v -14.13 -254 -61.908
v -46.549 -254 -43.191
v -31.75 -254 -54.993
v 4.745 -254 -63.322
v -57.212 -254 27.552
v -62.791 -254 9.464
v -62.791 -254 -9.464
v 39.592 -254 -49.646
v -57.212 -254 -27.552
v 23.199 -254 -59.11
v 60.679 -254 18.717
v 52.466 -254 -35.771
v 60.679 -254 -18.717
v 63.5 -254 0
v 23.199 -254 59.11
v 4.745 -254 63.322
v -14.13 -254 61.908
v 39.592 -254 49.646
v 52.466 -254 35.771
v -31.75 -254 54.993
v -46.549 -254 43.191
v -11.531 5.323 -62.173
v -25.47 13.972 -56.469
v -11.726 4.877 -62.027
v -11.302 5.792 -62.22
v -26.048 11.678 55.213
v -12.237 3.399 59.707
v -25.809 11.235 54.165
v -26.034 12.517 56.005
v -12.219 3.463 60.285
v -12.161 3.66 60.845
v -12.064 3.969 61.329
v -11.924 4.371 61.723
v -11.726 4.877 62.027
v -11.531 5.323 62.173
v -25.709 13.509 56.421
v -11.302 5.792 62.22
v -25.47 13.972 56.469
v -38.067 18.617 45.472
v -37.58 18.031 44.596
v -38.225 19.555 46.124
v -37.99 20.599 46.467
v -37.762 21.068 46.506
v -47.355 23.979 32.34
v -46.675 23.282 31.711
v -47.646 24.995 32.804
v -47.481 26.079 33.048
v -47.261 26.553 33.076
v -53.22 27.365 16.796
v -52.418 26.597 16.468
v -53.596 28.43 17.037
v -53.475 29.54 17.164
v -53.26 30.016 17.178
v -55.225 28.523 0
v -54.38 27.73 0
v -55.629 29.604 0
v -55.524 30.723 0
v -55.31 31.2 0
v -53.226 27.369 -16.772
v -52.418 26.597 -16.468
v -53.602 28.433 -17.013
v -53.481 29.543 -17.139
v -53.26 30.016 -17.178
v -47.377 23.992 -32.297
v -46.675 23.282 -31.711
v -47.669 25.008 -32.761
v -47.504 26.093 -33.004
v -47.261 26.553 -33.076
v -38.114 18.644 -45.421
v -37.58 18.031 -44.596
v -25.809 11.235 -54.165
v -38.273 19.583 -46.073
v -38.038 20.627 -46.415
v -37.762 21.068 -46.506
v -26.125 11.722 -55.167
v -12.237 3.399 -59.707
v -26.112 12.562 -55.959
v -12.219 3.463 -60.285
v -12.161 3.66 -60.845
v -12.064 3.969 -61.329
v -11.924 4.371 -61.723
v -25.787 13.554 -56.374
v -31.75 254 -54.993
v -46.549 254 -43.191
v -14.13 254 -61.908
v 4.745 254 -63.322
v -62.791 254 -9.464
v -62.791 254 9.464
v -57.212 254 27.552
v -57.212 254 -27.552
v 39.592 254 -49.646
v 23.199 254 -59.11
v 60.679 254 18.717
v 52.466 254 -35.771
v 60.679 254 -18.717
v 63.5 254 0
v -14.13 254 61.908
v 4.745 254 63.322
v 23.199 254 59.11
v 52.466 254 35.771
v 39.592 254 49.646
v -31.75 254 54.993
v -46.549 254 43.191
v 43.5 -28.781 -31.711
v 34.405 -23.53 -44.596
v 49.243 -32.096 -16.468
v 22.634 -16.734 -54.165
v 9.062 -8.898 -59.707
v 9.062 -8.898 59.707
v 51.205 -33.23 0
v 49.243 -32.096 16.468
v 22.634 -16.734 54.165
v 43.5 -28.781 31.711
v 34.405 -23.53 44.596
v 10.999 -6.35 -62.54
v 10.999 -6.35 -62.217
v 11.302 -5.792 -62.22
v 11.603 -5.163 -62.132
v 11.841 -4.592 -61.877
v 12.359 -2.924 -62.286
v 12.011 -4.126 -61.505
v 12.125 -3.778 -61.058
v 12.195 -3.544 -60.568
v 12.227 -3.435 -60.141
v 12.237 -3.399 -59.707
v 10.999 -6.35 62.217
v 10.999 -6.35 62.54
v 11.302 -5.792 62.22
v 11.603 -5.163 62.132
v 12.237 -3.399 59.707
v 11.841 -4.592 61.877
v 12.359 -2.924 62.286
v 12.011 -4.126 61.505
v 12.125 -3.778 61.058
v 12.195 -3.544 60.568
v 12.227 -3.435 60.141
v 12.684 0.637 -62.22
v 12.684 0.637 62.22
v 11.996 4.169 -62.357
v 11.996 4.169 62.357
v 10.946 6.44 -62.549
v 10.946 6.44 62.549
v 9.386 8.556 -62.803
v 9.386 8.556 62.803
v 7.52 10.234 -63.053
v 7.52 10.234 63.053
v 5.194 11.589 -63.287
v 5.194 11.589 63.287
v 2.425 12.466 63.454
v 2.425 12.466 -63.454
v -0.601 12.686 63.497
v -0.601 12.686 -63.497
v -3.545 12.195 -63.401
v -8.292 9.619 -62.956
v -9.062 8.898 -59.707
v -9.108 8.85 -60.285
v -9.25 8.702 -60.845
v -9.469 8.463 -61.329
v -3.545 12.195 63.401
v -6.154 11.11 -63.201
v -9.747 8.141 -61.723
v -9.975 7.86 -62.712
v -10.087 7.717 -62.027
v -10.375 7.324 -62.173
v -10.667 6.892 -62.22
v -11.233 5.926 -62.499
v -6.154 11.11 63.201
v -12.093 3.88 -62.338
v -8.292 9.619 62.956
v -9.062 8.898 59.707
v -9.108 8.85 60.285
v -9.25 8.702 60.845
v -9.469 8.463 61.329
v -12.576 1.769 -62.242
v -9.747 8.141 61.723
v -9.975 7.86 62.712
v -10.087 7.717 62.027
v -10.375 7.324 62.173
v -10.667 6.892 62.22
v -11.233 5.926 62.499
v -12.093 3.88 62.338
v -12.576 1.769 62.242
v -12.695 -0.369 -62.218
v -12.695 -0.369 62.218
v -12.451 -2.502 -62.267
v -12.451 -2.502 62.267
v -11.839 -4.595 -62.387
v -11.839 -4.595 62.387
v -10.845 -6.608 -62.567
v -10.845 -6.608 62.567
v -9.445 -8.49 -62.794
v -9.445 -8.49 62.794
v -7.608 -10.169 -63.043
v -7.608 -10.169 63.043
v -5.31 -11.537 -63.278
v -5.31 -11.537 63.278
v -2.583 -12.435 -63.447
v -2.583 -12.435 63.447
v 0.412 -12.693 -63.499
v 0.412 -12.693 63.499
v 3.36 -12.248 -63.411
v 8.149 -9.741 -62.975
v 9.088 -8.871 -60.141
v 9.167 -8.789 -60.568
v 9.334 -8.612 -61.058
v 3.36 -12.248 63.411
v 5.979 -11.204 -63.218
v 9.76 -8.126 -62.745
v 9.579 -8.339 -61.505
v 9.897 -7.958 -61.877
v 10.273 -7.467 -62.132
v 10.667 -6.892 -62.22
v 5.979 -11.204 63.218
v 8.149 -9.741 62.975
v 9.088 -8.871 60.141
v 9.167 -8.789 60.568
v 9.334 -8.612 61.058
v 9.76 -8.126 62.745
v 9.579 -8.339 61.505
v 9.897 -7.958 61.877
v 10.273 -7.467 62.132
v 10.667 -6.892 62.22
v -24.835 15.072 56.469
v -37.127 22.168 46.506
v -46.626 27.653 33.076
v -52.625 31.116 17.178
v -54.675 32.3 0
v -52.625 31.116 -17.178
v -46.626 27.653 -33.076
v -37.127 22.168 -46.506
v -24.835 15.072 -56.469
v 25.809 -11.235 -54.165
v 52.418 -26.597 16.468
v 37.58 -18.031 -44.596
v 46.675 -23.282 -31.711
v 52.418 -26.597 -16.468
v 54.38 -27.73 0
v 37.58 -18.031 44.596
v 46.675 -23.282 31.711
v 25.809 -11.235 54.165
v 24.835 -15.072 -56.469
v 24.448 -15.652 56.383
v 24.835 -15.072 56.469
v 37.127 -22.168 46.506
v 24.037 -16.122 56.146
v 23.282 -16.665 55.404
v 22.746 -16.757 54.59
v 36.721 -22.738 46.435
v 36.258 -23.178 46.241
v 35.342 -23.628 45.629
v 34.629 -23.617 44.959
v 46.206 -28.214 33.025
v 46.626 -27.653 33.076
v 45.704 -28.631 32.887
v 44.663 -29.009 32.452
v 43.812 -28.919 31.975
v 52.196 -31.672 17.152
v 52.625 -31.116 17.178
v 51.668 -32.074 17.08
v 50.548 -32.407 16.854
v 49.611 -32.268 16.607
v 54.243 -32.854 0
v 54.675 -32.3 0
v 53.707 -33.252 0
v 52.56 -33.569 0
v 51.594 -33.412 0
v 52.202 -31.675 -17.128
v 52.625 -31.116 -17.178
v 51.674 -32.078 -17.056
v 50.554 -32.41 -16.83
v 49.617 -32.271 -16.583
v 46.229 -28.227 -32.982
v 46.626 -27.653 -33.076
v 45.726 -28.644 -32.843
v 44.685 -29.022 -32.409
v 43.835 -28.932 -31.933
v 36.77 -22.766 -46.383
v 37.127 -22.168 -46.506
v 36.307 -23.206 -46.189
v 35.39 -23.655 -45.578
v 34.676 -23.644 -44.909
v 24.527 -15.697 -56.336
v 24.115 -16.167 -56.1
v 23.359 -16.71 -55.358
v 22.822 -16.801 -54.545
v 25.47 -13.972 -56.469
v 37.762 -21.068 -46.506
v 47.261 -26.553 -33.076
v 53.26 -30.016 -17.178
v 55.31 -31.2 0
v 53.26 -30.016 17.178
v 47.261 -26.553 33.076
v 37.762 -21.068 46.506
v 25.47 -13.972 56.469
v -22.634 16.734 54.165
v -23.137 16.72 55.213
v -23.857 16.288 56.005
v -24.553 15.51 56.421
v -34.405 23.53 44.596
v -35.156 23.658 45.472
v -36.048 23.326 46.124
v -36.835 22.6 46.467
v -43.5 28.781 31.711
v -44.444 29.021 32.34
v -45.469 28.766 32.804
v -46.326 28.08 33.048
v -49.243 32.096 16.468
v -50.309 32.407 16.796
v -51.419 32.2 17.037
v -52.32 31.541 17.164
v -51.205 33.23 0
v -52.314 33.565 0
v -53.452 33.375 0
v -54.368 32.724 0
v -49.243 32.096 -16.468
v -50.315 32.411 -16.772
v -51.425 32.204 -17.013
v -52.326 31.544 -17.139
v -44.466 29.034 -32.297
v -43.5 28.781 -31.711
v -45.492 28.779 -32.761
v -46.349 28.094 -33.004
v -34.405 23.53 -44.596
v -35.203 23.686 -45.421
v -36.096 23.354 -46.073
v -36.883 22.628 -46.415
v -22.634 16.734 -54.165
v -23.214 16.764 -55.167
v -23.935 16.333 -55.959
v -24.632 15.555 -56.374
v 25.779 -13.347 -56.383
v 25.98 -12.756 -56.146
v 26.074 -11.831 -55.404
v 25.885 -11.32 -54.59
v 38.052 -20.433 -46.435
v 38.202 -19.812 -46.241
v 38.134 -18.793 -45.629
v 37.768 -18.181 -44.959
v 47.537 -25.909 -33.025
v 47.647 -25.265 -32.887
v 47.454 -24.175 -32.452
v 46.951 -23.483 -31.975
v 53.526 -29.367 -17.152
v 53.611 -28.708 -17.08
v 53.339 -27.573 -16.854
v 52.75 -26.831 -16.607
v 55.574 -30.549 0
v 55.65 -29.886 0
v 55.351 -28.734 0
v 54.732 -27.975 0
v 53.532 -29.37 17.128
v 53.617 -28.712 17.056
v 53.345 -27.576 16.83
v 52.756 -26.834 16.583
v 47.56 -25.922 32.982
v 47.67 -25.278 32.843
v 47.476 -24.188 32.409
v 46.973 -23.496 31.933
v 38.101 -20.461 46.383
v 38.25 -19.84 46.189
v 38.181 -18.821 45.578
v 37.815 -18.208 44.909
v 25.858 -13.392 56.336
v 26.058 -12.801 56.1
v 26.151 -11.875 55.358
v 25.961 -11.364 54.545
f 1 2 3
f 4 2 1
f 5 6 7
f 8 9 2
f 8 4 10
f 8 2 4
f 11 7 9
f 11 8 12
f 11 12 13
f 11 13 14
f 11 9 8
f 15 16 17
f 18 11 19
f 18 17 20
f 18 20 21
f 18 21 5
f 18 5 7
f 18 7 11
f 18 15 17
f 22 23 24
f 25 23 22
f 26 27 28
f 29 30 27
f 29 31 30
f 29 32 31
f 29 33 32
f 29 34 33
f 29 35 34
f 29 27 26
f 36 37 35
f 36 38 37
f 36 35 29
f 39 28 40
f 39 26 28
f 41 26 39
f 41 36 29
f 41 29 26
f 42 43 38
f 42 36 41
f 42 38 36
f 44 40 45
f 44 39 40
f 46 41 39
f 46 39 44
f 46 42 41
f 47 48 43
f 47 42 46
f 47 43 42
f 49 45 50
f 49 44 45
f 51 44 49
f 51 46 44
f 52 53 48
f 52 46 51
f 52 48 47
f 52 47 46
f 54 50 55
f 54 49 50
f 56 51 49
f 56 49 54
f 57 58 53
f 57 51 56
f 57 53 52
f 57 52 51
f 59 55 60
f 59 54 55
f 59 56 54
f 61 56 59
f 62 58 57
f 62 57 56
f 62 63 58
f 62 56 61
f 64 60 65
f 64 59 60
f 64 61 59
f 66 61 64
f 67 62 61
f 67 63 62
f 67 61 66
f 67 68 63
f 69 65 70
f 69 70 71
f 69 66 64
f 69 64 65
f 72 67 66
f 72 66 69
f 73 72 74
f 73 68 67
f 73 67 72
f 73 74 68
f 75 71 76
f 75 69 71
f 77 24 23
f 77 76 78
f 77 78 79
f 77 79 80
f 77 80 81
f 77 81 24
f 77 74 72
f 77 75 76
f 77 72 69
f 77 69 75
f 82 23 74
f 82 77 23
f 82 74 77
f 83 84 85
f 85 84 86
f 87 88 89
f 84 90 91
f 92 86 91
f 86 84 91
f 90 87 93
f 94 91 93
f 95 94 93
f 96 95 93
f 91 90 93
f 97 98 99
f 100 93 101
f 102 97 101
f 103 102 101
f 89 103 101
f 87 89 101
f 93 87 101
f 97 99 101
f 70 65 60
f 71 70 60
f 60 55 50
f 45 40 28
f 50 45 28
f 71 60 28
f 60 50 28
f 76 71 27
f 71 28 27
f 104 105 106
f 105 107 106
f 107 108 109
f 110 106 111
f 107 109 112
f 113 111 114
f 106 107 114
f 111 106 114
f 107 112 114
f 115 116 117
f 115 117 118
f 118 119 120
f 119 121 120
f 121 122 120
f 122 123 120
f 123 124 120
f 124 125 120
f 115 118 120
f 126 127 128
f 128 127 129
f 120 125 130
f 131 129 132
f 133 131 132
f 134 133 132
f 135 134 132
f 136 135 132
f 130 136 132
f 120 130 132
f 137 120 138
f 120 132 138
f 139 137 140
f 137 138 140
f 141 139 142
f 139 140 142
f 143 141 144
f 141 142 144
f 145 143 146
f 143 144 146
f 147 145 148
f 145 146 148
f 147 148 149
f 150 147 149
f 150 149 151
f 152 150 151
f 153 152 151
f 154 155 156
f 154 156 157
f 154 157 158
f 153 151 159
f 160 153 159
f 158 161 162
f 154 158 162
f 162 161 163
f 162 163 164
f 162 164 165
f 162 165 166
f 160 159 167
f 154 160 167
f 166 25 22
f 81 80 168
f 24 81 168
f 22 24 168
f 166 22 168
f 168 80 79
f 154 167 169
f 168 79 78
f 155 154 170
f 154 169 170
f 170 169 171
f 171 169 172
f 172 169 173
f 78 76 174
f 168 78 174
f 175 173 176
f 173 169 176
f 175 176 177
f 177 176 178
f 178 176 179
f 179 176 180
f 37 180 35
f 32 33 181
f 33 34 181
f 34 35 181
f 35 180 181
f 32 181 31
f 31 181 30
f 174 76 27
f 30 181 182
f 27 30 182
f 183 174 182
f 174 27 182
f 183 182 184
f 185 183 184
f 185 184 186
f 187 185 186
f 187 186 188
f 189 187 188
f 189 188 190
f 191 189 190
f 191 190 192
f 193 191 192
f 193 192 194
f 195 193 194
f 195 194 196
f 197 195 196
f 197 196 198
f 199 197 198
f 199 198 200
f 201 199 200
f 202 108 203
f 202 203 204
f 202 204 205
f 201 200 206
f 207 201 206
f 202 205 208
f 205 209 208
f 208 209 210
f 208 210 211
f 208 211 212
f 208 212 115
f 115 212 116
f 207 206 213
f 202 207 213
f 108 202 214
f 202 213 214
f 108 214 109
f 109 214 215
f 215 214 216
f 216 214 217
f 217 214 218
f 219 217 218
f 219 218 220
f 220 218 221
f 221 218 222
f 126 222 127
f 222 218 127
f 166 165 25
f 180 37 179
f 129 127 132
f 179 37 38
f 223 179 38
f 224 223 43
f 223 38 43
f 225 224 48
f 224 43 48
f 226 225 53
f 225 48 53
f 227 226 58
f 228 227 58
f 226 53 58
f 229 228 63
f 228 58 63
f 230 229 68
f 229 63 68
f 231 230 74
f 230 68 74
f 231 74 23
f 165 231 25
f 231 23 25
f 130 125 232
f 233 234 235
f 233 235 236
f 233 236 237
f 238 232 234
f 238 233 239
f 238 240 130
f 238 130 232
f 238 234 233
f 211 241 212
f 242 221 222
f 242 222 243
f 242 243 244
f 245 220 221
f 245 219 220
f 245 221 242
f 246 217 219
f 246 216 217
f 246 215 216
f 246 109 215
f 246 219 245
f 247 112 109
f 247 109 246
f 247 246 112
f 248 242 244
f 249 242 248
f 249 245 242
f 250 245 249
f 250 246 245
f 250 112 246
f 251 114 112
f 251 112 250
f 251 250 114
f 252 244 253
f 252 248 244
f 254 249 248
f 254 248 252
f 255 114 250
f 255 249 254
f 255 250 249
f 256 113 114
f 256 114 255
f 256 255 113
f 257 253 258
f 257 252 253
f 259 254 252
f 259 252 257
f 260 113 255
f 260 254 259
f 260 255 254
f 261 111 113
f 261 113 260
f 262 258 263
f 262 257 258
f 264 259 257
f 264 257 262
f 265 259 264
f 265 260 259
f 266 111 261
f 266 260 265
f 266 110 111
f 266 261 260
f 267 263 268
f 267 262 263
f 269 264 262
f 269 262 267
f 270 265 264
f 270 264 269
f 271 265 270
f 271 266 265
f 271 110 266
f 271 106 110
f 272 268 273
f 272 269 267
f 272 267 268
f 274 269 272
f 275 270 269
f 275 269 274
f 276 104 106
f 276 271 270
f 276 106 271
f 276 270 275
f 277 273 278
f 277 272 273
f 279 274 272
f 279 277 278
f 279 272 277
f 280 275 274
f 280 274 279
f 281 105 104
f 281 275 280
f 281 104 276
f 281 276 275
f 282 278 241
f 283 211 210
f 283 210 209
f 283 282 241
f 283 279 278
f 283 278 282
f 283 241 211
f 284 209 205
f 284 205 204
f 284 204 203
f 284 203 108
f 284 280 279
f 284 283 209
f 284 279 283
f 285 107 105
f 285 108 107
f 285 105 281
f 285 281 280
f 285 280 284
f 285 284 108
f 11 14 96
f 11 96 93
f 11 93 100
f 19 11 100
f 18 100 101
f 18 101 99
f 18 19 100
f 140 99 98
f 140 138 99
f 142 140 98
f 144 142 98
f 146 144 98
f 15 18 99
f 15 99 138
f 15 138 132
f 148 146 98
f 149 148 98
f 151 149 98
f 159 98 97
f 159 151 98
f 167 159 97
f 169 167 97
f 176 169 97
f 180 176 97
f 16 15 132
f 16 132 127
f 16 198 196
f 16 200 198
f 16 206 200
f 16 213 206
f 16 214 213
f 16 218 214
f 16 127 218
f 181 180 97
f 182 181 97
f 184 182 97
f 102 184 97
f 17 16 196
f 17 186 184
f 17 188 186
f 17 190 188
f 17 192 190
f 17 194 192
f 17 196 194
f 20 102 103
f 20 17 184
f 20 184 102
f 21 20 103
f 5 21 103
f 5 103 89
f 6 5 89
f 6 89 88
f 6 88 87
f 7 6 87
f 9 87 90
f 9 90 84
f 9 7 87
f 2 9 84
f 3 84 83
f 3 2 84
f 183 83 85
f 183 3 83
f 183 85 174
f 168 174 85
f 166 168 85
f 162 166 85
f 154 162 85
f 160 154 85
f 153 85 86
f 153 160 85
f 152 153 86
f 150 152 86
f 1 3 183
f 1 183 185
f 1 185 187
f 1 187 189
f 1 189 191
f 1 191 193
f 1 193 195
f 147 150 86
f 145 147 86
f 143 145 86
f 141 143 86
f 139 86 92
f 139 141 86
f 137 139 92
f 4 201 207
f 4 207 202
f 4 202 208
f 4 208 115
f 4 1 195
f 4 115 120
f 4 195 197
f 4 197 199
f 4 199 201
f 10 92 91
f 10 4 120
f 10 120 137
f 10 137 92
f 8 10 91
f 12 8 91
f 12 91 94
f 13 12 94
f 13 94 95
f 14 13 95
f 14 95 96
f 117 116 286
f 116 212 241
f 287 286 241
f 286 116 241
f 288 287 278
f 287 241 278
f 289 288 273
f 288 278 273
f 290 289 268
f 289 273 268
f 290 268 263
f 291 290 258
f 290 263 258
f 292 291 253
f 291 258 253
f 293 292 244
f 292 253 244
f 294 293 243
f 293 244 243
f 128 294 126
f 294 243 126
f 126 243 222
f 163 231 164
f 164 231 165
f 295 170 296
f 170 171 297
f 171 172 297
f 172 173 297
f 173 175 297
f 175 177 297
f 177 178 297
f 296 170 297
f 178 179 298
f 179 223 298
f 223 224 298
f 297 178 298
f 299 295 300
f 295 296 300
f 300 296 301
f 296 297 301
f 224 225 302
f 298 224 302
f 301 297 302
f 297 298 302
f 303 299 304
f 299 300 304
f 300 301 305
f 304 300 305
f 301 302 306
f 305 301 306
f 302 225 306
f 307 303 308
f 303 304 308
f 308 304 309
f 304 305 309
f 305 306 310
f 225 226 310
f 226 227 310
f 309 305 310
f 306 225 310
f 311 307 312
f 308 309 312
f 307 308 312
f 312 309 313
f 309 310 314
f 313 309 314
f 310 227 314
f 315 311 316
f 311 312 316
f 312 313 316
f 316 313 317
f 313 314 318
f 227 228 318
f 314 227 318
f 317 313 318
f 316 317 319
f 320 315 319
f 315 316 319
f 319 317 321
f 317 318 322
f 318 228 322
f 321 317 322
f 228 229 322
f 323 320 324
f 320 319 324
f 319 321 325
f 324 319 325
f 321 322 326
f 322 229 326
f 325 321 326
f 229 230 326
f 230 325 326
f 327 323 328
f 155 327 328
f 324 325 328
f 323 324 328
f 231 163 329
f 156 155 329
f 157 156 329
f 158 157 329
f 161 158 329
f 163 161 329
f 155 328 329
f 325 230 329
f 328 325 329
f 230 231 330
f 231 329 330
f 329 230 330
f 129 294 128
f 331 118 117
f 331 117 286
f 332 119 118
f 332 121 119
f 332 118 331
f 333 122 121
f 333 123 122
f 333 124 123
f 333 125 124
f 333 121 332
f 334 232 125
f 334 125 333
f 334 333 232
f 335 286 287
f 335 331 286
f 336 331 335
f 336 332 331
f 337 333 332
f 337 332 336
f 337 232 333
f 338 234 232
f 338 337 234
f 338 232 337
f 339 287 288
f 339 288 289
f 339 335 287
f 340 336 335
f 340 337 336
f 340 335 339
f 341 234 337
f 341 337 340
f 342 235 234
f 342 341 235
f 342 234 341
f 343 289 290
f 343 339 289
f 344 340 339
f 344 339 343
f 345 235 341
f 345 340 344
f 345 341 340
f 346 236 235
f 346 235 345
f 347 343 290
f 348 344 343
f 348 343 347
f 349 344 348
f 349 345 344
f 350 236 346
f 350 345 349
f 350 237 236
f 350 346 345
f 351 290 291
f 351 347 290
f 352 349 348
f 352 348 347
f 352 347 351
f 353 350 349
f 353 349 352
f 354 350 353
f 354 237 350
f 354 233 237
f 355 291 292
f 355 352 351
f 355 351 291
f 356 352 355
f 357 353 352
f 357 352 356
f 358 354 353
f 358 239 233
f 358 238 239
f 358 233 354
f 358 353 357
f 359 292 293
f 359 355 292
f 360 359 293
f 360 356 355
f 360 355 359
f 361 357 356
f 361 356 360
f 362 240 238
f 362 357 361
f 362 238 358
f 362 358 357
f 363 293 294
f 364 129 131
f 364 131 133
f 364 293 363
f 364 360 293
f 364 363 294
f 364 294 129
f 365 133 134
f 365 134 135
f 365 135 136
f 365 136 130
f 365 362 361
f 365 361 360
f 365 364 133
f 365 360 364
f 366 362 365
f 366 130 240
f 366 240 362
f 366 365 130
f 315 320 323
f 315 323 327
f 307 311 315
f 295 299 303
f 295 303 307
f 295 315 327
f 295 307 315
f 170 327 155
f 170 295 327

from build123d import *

# Parameters (mm, degrees)
F1_R     = 12.7
F2_DEPTH = 95.25
F0_R     = 63.5
F3_DEPTH = 3.175
F4_R     = 2.54
F6_ANGLE = 30
F7_R     = 63.5
F8_DEPTH = 254


with BuildPart() as f2:
    # F1 (on Top) → F2 (new body, symmetric)
    with BuildSketch(Plane.XY):
        Circle(F1_R)
    extrude(amount=F2_DEPTH, both=True)

    # F0 (on Front) → F3 (join, symmetric)
    with BuildSketch(Plane.XZ):
        Circle(F0_R)
    extrude(amount=F3_DEPTH, both=True)

    # F4
    f4_edges = [f2.edges().sort_by_distance(p)[0] for p in [
        (-63.5, -3.175, 0),
        (63.5, -3.175, 0),
        (-63.5, 3.175, 0),
        (63.5, 3.175, 0),
    ]]
    fillet(f4_edges, radius=F4_R)


with BuildPart() as f2_1:
    # F6: moved
    add(f2.part.rotate(Axis((0, 0, -0.5104467273), (0, 0, -1)), F6_ANGLE))


with BuildPart() as f8:
    # F7 (on Front) → F8 (new body, symmetric)
    with BuildSketch(Plane.XZ):
        Circle(F7_R)
    extrude(amount=F8_DEPTH, both=True)

    # F9: cut F2
    add(f2_1.part, mode=Mode.SUBTRACT)


solid = f8.part
